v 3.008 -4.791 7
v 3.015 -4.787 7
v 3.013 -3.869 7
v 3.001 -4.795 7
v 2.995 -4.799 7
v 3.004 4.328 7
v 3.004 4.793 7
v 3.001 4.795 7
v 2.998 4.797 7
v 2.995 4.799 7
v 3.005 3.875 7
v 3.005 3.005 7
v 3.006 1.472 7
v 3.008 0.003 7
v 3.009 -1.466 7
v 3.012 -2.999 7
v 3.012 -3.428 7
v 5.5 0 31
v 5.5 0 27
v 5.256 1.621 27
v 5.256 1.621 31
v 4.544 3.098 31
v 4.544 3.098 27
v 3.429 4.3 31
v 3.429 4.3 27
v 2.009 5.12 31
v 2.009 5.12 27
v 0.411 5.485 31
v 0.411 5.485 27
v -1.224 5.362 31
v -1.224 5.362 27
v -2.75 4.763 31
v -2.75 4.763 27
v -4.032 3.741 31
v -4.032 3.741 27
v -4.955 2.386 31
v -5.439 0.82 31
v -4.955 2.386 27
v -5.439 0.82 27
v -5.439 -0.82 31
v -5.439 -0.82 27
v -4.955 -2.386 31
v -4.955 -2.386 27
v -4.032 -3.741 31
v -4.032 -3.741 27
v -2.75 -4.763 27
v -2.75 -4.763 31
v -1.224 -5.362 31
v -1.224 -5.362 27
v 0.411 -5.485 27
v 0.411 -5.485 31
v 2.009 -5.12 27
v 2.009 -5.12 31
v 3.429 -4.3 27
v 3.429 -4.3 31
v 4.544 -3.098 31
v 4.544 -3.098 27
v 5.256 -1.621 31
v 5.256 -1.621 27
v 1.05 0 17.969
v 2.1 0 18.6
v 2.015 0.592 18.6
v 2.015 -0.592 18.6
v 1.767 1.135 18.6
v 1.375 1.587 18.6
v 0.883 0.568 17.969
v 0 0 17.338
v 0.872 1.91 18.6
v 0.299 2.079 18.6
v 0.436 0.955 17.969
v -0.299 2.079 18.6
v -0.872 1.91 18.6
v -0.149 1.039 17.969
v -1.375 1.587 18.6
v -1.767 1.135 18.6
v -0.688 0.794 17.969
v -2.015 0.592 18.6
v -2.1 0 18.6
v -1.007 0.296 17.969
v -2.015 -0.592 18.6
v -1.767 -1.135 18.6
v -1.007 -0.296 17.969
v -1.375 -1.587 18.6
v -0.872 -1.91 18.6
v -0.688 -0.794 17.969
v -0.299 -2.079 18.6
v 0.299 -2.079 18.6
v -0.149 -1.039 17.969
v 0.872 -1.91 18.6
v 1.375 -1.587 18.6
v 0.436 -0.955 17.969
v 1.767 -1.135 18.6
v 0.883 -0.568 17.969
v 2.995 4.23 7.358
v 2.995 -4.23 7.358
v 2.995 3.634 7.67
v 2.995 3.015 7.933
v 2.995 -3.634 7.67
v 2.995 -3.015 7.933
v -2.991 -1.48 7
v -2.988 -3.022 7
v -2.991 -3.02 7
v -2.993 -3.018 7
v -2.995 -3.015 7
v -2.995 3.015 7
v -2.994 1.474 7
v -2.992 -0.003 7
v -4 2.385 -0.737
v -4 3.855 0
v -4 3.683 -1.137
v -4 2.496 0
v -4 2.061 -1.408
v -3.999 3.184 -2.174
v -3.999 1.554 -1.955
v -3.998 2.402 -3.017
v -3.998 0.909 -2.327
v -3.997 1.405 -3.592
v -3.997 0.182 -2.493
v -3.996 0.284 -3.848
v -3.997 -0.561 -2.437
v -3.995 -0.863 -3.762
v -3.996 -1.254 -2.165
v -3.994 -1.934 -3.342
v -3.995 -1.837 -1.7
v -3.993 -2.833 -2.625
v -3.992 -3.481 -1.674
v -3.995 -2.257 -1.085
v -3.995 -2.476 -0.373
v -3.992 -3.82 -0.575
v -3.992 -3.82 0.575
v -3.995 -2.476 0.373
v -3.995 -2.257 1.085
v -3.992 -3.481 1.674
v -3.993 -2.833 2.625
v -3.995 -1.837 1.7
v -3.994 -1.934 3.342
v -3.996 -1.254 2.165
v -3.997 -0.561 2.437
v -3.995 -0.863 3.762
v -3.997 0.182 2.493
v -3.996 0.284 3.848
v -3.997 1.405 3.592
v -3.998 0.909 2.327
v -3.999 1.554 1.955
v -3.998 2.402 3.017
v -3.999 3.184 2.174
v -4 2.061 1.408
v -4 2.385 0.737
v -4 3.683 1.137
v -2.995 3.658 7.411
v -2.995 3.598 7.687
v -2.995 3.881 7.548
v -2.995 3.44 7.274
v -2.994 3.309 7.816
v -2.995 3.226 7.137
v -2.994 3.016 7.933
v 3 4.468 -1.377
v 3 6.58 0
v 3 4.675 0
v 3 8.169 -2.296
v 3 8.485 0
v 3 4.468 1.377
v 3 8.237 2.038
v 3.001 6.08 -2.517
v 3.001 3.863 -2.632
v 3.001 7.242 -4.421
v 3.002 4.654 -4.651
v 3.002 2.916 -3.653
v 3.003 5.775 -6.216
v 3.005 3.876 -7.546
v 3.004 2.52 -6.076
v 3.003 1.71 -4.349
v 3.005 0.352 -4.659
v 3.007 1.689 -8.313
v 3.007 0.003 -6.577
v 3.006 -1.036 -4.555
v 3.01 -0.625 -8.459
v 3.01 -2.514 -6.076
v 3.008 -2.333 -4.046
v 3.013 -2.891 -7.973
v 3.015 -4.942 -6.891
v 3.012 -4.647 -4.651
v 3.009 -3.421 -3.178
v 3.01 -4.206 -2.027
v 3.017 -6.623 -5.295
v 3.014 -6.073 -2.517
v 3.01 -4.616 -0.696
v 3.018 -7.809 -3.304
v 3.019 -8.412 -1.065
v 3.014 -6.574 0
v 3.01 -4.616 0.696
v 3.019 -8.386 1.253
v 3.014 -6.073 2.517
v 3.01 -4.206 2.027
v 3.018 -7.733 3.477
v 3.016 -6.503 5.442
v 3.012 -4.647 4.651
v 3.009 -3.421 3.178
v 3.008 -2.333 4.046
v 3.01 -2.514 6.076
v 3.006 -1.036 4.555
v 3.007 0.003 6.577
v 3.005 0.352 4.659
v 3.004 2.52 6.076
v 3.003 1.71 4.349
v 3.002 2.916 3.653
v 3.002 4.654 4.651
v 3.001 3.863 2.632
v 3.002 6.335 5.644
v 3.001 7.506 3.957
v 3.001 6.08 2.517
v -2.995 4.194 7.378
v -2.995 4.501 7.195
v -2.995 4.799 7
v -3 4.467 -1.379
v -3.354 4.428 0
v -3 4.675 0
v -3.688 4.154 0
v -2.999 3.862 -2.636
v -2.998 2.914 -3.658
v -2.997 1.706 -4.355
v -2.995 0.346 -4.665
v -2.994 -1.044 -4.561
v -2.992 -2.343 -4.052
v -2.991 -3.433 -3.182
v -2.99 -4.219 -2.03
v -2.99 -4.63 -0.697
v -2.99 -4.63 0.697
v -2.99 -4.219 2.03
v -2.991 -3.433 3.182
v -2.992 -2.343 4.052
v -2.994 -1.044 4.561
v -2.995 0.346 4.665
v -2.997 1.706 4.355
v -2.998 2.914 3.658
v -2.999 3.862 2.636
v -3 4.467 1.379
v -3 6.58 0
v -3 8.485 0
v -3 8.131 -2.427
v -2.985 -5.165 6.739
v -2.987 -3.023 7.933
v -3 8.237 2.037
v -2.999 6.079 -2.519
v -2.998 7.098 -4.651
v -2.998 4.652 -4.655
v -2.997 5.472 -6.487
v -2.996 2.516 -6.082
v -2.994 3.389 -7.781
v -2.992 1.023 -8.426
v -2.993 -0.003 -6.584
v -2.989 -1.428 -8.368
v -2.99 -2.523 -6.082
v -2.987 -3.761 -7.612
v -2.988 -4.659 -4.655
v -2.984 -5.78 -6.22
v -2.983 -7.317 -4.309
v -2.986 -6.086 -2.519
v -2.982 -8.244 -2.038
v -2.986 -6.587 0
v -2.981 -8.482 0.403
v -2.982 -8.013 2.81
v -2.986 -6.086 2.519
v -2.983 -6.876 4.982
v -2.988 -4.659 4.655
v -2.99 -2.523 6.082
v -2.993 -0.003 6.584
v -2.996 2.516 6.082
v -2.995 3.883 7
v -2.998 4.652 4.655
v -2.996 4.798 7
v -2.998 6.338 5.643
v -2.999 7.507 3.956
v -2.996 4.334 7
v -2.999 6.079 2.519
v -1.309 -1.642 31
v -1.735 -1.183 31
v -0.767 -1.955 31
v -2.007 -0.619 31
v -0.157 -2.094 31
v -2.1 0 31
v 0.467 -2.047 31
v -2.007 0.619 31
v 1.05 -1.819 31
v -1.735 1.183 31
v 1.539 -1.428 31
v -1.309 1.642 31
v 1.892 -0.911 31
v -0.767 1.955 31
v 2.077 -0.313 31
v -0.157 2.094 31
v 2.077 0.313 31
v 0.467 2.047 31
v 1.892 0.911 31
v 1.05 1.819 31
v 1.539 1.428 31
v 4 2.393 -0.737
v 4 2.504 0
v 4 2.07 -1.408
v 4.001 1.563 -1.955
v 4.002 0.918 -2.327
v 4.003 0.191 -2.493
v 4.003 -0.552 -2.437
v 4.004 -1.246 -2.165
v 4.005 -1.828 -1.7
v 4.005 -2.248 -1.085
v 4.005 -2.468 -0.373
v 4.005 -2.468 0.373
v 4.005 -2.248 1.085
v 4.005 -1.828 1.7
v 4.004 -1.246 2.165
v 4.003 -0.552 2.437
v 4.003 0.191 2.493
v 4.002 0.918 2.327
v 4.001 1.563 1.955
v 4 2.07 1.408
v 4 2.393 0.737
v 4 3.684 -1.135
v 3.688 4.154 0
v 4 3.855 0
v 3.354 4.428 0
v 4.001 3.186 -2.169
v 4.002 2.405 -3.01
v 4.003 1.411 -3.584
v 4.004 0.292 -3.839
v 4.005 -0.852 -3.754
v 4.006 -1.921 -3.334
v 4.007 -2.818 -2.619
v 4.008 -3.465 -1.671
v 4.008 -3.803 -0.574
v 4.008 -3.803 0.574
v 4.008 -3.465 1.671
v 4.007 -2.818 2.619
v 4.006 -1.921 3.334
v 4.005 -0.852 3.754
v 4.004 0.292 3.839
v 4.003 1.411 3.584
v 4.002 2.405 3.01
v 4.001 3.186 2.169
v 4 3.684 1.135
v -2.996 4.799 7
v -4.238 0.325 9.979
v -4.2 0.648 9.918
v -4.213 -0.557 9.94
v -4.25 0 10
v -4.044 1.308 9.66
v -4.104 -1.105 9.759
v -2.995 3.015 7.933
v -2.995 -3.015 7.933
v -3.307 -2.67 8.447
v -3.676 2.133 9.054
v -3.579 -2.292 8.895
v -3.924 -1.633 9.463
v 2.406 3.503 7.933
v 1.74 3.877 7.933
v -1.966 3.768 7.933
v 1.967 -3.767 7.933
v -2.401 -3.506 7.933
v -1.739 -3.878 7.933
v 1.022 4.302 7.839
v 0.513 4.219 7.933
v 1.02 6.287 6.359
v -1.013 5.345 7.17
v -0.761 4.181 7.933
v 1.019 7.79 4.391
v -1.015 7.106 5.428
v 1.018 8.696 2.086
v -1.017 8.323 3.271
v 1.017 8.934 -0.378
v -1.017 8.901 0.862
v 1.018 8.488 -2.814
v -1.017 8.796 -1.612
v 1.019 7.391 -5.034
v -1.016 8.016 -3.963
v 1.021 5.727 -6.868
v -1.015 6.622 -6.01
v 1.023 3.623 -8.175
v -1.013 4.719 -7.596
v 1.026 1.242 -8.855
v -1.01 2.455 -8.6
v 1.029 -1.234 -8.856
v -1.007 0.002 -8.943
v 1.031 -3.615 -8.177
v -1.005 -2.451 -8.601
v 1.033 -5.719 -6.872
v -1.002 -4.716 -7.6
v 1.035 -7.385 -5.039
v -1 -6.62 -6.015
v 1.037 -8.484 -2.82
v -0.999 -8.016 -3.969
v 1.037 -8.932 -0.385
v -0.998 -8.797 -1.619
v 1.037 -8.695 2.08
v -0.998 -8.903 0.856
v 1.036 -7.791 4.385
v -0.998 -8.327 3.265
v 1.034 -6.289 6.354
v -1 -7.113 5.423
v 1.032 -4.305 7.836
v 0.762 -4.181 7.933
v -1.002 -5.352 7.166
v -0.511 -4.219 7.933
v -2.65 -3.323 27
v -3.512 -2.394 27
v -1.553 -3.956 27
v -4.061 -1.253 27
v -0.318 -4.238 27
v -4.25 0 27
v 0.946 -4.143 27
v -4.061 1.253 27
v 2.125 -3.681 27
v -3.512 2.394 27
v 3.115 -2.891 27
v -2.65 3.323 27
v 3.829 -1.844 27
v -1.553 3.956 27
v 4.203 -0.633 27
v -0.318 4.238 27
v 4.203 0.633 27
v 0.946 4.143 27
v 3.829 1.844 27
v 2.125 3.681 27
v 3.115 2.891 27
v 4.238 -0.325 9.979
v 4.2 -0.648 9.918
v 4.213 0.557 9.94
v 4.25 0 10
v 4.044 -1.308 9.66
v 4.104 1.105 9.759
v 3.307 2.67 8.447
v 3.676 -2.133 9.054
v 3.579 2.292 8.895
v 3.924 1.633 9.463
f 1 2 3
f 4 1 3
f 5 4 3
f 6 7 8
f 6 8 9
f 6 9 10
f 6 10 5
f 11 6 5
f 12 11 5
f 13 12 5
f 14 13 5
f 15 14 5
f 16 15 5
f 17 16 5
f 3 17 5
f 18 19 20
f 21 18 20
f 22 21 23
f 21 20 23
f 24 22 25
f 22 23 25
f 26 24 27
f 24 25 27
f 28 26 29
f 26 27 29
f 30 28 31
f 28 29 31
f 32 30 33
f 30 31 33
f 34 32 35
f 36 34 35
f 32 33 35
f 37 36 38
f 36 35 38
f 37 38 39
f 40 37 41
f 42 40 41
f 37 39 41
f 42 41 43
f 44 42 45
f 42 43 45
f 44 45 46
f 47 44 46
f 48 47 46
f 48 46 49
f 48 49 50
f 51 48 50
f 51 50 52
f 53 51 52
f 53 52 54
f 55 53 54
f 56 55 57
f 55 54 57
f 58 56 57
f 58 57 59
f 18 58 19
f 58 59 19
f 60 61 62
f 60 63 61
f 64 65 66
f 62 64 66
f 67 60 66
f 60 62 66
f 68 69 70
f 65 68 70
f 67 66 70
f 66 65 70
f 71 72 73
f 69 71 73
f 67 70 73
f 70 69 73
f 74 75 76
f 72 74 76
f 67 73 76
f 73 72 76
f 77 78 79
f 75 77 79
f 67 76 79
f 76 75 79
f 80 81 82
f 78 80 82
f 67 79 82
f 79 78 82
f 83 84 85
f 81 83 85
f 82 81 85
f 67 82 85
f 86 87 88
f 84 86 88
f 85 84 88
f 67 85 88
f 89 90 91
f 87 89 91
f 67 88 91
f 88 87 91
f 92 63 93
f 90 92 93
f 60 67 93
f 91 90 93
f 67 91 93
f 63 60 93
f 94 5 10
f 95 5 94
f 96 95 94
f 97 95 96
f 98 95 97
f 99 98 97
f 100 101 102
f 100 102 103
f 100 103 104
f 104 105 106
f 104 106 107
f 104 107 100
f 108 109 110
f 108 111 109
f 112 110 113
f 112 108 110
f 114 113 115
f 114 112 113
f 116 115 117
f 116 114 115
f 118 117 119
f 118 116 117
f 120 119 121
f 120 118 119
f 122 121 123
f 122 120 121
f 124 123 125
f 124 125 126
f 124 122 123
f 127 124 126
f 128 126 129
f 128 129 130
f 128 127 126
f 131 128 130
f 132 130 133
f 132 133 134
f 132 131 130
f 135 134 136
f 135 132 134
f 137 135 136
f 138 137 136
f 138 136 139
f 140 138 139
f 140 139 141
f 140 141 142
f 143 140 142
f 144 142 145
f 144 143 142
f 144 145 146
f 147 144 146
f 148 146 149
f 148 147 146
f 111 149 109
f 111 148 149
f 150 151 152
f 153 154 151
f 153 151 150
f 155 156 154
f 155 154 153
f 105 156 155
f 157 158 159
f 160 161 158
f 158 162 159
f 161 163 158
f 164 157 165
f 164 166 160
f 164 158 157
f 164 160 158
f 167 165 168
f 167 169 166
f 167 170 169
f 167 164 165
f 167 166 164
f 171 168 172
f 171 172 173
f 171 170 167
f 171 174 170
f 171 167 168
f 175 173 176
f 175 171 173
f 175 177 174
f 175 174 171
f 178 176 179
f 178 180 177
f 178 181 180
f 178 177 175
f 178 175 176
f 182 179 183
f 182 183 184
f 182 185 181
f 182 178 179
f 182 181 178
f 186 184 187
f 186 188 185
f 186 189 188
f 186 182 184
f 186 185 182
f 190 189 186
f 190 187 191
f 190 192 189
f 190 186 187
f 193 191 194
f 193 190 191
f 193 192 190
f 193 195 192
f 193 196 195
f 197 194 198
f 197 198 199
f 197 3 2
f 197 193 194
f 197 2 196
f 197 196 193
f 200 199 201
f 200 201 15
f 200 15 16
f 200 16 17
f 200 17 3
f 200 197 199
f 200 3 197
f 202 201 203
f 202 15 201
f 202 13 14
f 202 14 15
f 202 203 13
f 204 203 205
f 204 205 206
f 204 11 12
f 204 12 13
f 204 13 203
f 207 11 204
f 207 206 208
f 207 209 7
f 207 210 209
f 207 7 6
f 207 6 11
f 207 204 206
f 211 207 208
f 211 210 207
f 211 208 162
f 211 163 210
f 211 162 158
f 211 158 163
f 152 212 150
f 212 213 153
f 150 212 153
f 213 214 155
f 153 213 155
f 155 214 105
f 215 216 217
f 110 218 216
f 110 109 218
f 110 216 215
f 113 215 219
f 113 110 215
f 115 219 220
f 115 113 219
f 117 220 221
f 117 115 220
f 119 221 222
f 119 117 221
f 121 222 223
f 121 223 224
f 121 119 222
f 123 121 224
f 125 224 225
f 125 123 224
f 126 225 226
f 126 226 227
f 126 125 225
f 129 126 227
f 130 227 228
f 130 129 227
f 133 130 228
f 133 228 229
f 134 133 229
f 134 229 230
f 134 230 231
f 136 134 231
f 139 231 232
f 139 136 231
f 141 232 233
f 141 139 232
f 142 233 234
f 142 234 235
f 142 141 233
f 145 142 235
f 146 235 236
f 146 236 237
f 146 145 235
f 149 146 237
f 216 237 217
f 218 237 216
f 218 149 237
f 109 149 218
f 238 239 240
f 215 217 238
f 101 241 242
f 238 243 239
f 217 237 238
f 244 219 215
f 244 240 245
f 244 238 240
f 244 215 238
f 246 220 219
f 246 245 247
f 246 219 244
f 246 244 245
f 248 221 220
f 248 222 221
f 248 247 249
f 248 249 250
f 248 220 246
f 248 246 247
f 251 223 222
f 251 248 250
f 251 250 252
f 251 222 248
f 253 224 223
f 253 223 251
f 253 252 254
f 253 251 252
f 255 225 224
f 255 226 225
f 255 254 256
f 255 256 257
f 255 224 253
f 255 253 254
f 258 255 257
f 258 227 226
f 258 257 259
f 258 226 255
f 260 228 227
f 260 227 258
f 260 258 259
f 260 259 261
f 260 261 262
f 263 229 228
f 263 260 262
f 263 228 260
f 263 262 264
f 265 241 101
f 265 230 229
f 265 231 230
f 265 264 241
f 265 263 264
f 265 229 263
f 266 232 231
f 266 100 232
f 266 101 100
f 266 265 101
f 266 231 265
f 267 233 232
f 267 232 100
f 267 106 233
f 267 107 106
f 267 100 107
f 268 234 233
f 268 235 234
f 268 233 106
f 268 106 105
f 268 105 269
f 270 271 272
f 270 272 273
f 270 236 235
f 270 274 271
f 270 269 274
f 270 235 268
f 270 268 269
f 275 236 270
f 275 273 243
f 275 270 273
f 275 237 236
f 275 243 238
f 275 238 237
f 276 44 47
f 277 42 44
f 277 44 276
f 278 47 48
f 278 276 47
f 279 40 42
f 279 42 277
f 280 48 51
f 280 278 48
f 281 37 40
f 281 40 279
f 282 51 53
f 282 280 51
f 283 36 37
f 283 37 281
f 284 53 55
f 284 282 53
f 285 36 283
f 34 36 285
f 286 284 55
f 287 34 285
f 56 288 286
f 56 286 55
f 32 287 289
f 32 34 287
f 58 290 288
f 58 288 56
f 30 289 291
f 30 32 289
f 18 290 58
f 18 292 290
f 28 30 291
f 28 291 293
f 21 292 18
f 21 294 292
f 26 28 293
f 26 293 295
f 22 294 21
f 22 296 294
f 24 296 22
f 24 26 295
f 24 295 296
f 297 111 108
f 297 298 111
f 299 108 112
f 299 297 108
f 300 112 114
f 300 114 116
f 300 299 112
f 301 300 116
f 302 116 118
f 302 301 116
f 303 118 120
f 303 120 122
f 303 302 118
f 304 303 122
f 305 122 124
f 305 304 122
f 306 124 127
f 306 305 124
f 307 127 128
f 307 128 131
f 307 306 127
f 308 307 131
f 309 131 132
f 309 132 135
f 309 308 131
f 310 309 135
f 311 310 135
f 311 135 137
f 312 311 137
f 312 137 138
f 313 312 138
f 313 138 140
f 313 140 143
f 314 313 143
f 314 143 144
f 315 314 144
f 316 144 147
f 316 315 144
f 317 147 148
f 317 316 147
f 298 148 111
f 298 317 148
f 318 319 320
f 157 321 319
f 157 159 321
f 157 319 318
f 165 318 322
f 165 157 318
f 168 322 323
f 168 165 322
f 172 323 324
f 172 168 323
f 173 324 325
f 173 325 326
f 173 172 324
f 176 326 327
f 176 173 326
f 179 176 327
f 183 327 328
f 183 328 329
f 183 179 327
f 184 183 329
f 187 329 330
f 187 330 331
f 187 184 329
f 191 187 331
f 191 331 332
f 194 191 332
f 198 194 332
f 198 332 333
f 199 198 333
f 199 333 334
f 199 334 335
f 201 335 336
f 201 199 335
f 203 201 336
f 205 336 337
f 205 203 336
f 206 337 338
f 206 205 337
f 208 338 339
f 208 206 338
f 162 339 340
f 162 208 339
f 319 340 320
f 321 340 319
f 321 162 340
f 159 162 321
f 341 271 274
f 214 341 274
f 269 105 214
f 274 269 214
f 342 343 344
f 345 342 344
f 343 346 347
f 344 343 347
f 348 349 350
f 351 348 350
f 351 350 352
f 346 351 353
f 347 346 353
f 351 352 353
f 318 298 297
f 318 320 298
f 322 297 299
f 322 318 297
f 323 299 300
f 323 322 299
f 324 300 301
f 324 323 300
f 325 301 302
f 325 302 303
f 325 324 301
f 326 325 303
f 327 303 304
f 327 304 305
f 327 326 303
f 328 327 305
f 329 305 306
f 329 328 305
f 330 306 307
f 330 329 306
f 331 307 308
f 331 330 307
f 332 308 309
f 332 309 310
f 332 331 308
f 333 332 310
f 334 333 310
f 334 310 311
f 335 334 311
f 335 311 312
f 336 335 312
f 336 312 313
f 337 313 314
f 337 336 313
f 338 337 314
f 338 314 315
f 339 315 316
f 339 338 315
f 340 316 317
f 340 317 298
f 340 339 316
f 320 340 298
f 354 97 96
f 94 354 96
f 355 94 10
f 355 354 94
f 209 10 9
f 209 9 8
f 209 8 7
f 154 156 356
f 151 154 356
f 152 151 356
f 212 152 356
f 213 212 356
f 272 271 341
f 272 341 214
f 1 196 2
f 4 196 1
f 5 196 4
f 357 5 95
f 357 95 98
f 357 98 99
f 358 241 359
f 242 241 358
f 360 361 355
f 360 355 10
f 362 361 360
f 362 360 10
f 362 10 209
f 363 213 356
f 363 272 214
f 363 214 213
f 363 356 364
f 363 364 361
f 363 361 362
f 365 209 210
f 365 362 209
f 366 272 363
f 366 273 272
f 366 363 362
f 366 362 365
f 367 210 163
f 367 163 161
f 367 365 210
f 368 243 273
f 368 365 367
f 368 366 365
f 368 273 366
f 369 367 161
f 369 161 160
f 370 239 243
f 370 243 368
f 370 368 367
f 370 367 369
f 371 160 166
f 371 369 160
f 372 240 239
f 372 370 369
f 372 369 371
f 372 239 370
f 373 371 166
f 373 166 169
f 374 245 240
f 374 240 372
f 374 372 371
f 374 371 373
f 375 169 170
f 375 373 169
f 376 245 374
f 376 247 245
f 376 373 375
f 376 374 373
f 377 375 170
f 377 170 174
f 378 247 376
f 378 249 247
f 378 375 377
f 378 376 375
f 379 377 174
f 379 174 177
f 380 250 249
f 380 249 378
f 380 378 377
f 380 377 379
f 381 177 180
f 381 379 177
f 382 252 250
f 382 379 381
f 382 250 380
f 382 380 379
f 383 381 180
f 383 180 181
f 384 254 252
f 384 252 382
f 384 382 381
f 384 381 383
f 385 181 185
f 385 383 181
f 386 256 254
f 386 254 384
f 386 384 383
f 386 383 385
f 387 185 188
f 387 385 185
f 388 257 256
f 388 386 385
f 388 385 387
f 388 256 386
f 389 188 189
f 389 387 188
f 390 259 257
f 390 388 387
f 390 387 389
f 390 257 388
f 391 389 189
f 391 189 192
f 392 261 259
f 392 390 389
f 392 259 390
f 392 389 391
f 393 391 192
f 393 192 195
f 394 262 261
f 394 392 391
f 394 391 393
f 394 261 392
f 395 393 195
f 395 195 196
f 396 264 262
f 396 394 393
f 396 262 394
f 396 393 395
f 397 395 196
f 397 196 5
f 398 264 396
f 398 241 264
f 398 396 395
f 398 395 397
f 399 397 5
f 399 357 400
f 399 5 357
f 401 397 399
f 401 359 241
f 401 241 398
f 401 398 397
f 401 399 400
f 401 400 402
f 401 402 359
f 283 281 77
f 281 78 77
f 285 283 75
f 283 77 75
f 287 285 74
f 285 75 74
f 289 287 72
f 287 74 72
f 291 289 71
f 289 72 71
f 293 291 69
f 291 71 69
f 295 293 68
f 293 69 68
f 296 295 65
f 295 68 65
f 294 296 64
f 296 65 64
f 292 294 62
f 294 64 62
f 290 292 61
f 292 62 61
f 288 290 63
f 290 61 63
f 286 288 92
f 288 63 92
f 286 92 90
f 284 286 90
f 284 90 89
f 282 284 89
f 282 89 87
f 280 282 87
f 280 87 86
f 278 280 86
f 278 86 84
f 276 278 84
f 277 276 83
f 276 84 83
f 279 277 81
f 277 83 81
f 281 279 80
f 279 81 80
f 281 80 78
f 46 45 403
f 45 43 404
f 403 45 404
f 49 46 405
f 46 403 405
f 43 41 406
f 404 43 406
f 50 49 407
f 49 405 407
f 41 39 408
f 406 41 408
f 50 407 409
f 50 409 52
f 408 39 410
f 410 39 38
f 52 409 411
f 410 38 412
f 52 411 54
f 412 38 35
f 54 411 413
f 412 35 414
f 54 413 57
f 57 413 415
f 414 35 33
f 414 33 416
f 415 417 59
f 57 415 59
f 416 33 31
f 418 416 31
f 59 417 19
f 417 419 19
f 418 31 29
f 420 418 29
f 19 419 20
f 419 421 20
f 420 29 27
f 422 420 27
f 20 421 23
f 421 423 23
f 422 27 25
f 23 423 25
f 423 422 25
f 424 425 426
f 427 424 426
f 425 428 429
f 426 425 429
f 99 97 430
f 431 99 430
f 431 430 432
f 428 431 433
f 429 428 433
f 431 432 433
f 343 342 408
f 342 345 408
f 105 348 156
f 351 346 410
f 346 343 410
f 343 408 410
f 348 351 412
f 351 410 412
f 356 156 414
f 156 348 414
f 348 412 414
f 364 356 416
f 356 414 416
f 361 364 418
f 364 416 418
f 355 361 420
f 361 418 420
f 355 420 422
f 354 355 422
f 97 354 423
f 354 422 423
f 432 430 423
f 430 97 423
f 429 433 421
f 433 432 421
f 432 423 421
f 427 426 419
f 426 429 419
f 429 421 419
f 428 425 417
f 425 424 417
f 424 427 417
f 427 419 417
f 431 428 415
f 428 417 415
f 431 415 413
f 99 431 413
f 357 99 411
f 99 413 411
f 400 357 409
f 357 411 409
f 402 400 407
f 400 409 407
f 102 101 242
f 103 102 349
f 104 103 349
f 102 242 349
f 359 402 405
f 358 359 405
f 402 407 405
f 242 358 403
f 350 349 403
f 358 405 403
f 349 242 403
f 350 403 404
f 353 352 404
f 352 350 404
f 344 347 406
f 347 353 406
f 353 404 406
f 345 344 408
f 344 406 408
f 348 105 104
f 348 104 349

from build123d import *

# Parameters (mm, degrees)
SKETCH_3_R             = 5.5
EXTRUDE_2_DEPTH        = 4
SKETCH_4_R             = 4.25
EXTRUDE_3_DEPTH        = 20
CUT_EXTRUDE_1_DEPTH    = 10
HOLE_WIZARD_M5_1_D     = 4.2
HOLE_WIZARD_M5_1_DEPTH = 12.4
HOLE_WIZARD_M5_1_TIP   = 1.2618073


with BuildPart() as part:
    # 草图1 → 旋转1 (revolve)
    with BuildSketch(Plane.XY):
        with BuildLine():
            Line((-4, 3.854610875), (-4, 2.495599217))
            Line((-4, 2.495599217), (4, 2.504403811))
            Line((4, 2.504403811), (4, 3.854610875))
            ThreePointArc((4, 3.854610875), (3.523970046, 4.294142536), (3, 4.675256677))
            Line((3, 4.675256677), (3, 8.485281374))
            ThreePointArc((3, 8.485281374), (0, 9), (-3, 8.485281374))
            Line((-3, 8.485281374), (-3, 4.675256677))
            ThreePointArc((-3, 4.675256677), (-3.523970046, 4.294142536), (-4, 3.854610875))
        make_face()
    revolve(axis=Axis((3.999995155, 0.004402291, 0), (-0.999999394, -0.001100574, 0)))



with BuildPart() as body_2:
    # 草图3 → 凸台-拉伸2 (new body)
    with BuildSketch(Plane.XY.offset(27)):
        Circle(SKETCH_3_R)
    extrude(amount=EXTRUDE_2_DEPTH)


with BuildPart() as part_1:
    add(part.part)

    add(body_2.part)  # 凸台-拉伸3 merges body 2
    # 草图4 → 凸台-拉伸3 (add)
    with BuildSketch(Plane(origin=(0, 0, 27), x_dir=(-1, 0, 0), z_dir=(0, 0, -1))):
        Circle(SKETCH_4_R)
    extrude(amount=EXTRUDE_3_DEPTH)

    # 草图5 → 切除-拉伸1 (cut, symmetric)
    with BuildSketch(Plane(origin=(0, 0, 0), x_dir=(1, 0, 0), z_dir=(0, 1, 0))):
        Polygon((-2.994932477, -7), (-2.994932477, -7.933315826), (-4.25, -10), (-4.25, -7), align=None)
        Polygon((4.25, -7), (2.994932477, -7), (2.994932477, -7.933315826), (4.25, -10), align=None)
    extrude(amount=CUT_EXTRUDE_1_DEPTH, both=True, mode=Mode.SUBTRACT)

    # M5 螺纹孔1
    with Locations(Plane.XY.offset(31)):
        with Locations((0, 0)):
            Hole(HOLE_WIZARD_M5_1_D / 2, depth=HOLE_WIZARD_M5_1_DEPTH)
            with Locations((0, 0, -(HOLE_WIZARD_M5_1_DEPTH + HOLE_WIZARD_M5_1_TIP / 2))):  # 118° drill point
                Cone(0, HOLE_WIZARD_M5_1_D / 2, HOLE_WIZARD_M5_1_TIP, mode=Mode.SUBTRACT)


solid = part_1.part
